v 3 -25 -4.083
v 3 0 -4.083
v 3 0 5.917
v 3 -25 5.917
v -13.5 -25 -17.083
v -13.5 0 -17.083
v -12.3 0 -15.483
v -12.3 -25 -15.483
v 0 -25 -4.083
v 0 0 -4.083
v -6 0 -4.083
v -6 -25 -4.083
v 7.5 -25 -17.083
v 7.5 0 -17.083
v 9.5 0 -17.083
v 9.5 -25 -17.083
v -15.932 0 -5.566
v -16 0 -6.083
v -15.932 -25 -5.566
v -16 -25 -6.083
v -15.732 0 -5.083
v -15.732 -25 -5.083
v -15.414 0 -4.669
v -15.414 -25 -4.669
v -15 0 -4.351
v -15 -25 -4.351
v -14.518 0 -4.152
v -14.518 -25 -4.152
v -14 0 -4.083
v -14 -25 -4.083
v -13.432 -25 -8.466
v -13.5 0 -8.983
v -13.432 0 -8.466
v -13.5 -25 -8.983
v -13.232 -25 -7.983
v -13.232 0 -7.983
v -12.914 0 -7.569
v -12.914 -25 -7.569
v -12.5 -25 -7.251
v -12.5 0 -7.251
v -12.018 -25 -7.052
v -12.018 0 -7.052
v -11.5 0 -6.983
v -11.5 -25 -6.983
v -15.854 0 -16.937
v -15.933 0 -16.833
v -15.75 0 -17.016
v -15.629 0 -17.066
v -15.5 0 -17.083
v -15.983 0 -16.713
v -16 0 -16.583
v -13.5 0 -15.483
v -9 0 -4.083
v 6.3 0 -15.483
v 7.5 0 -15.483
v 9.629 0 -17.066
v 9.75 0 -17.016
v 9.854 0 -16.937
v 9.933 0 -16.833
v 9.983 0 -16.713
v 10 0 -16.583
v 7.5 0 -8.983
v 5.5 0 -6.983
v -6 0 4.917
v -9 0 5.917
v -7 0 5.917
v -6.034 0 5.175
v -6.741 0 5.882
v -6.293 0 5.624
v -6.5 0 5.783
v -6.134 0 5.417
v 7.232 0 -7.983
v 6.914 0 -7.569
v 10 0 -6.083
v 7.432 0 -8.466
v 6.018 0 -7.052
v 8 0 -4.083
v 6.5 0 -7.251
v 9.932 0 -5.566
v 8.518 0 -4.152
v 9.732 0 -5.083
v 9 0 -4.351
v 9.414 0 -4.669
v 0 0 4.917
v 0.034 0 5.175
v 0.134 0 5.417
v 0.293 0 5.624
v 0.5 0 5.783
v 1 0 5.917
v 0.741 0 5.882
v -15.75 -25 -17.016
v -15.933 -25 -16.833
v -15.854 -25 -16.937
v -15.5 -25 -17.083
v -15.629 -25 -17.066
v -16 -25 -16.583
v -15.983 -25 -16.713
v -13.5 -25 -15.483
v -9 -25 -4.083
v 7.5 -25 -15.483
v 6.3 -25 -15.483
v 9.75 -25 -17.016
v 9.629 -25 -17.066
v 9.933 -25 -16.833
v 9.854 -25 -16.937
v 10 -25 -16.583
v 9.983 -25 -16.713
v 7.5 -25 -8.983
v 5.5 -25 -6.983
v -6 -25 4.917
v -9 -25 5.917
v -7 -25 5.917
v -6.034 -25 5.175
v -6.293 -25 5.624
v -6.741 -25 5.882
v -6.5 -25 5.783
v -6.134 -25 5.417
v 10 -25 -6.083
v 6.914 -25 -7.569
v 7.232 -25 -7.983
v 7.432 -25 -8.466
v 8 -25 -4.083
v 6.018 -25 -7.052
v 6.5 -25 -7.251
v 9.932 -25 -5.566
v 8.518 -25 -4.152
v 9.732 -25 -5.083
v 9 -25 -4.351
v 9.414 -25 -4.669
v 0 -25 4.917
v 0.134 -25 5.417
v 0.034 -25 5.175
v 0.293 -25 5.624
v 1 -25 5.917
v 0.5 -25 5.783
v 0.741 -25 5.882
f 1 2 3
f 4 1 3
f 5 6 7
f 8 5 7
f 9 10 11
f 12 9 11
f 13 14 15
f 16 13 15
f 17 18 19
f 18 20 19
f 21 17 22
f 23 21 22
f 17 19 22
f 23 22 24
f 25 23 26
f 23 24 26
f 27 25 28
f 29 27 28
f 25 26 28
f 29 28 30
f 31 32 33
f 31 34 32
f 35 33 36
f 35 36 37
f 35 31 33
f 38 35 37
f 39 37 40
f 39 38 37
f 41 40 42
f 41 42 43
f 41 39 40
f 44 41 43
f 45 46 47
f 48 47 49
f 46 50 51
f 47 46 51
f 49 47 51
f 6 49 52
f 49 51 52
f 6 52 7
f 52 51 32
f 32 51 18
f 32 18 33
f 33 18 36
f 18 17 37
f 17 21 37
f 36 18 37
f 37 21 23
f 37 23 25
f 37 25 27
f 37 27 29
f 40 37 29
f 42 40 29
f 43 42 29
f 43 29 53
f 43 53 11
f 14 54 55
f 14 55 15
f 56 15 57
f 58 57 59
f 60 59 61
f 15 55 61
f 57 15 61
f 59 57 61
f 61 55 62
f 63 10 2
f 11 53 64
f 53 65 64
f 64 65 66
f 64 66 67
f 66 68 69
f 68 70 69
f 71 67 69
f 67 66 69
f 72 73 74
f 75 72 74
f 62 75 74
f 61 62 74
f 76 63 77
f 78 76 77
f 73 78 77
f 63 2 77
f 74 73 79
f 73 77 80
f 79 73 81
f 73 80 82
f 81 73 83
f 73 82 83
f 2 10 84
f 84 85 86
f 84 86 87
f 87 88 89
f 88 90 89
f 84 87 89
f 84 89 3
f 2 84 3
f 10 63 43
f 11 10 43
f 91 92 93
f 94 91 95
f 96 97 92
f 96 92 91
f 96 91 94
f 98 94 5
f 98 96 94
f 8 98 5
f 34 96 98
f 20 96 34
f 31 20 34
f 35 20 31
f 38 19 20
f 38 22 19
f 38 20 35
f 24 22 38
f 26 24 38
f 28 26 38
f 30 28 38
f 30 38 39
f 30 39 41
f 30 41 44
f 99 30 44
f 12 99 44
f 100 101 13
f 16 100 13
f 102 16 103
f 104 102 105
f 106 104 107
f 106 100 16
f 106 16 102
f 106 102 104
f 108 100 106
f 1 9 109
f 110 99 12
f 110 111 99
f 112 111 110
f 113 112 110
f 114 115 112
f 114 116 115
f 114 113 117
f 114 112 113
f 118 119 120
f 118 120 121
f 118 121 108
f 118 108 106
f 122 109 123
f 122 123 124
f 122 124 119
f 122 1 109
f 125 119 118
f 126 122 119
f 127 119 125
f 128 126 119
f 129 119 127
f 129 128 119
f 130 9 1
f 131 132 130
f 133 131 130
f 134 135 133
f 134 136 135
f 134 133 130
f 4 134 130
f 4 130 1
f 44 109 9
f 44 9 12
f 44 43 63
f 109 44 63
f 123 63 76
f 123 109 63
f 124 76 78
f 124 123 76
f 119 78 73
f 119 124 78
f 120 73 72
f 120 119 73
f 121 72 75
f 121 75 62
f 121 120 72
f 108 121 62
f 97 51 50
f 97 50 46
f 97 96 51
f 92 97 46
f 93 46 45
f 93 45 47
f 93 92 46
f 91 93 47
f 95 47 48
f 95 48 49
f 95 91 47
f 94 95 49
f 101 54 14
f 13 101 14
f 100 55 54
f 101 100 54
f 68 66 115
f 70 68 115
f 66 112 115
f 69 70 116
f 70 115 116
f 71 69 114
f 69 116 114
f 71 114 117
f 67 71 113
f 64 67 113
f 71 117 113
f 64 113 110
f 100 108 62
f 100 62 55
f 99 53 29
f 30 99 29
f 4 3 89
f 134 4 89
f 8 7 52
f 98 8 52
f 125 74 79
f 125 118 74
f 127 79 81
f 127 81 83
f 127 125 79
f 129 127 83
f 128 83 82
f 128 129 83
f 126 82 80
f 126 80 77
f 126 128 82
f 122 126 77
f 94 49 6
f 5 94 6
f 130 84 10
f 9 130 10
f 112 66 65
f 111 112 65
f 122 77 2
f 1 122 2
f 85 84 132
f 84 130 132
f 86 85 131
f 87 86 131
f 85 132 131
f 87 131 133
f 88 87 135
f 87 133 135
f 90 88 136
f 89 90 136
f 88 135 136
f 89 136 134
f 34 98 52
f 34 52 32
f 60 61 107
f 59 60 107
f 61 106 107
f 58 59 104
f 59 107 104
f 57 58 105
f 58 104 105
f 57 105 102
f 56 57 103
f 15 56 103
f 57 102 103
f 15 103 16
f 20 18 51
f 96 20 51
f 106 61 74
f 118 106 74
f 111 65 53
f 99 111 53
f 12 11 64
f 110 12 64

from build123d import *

# Parameters (mm, degrees)
F1_DEPTH = 25
F2_R     = 2
F3_R     = 2
F4_R     = 1
F5_R     = 0.5


with BuildPart() as f1:
    # F0 (on Front) → F1 (new body)
    with BuildSketch(Plane.XZ):
        Polygon((-13.5, -15.483479), (-13.5, -6.983479), (7.5, -6.983479), (7.5, -15.483479), (6.3, -15.483479), (7.5, -17.083479), (10, -17.083479), (10, -4.083479), (3, -4.083479), (3, 5.916521), (0, 5.916521), (0, -4.083479), (-6, -4.083479), (-6, 5.916521), (-9, 5.916521), (-9, -4.083479), (-16, -4.083479), (-16, -17.083479), (-13.5, -17.083479), (-12.3, -15.483479), align=None)
    extrude(amount=F1_DEPTH)

    # F2
    f2_edges = [f1.edges().sort_by_distance(p)[0] for p in [
        (-13.5, -12.5, -6.983479),
        (7.5, -12.5, -6.983479),
    ]]
    fillet(f2_edges, radius=F2_R)

    # F3
    f3_edges = [f1.edges().sort_by_distance(p)[0] for p in [
        (10, -12.5, -4.083479),
        (-16, -12.5, -4.083479),
    ]]
    fillet(f3_edges, radius=F3_R)

    # F4
    f4_edges = [f1.edges().sort_by_distance(p)[0] for p in [
        (-6, -12.5, 5.916521),
        (0, -12.5, 5.916521),
    ]]
    fillet(f4_edges, radius=F4_R)

    # F5
    f5_edges = [f1.edges().sort_by_distance(p)[0] for p in [
        (10, -12.5, -17.083479),
        (-16, -12.5, -17.083479),
    ]]
    fillet(f5_edges, radius=F5_R)


solid = f1.part
